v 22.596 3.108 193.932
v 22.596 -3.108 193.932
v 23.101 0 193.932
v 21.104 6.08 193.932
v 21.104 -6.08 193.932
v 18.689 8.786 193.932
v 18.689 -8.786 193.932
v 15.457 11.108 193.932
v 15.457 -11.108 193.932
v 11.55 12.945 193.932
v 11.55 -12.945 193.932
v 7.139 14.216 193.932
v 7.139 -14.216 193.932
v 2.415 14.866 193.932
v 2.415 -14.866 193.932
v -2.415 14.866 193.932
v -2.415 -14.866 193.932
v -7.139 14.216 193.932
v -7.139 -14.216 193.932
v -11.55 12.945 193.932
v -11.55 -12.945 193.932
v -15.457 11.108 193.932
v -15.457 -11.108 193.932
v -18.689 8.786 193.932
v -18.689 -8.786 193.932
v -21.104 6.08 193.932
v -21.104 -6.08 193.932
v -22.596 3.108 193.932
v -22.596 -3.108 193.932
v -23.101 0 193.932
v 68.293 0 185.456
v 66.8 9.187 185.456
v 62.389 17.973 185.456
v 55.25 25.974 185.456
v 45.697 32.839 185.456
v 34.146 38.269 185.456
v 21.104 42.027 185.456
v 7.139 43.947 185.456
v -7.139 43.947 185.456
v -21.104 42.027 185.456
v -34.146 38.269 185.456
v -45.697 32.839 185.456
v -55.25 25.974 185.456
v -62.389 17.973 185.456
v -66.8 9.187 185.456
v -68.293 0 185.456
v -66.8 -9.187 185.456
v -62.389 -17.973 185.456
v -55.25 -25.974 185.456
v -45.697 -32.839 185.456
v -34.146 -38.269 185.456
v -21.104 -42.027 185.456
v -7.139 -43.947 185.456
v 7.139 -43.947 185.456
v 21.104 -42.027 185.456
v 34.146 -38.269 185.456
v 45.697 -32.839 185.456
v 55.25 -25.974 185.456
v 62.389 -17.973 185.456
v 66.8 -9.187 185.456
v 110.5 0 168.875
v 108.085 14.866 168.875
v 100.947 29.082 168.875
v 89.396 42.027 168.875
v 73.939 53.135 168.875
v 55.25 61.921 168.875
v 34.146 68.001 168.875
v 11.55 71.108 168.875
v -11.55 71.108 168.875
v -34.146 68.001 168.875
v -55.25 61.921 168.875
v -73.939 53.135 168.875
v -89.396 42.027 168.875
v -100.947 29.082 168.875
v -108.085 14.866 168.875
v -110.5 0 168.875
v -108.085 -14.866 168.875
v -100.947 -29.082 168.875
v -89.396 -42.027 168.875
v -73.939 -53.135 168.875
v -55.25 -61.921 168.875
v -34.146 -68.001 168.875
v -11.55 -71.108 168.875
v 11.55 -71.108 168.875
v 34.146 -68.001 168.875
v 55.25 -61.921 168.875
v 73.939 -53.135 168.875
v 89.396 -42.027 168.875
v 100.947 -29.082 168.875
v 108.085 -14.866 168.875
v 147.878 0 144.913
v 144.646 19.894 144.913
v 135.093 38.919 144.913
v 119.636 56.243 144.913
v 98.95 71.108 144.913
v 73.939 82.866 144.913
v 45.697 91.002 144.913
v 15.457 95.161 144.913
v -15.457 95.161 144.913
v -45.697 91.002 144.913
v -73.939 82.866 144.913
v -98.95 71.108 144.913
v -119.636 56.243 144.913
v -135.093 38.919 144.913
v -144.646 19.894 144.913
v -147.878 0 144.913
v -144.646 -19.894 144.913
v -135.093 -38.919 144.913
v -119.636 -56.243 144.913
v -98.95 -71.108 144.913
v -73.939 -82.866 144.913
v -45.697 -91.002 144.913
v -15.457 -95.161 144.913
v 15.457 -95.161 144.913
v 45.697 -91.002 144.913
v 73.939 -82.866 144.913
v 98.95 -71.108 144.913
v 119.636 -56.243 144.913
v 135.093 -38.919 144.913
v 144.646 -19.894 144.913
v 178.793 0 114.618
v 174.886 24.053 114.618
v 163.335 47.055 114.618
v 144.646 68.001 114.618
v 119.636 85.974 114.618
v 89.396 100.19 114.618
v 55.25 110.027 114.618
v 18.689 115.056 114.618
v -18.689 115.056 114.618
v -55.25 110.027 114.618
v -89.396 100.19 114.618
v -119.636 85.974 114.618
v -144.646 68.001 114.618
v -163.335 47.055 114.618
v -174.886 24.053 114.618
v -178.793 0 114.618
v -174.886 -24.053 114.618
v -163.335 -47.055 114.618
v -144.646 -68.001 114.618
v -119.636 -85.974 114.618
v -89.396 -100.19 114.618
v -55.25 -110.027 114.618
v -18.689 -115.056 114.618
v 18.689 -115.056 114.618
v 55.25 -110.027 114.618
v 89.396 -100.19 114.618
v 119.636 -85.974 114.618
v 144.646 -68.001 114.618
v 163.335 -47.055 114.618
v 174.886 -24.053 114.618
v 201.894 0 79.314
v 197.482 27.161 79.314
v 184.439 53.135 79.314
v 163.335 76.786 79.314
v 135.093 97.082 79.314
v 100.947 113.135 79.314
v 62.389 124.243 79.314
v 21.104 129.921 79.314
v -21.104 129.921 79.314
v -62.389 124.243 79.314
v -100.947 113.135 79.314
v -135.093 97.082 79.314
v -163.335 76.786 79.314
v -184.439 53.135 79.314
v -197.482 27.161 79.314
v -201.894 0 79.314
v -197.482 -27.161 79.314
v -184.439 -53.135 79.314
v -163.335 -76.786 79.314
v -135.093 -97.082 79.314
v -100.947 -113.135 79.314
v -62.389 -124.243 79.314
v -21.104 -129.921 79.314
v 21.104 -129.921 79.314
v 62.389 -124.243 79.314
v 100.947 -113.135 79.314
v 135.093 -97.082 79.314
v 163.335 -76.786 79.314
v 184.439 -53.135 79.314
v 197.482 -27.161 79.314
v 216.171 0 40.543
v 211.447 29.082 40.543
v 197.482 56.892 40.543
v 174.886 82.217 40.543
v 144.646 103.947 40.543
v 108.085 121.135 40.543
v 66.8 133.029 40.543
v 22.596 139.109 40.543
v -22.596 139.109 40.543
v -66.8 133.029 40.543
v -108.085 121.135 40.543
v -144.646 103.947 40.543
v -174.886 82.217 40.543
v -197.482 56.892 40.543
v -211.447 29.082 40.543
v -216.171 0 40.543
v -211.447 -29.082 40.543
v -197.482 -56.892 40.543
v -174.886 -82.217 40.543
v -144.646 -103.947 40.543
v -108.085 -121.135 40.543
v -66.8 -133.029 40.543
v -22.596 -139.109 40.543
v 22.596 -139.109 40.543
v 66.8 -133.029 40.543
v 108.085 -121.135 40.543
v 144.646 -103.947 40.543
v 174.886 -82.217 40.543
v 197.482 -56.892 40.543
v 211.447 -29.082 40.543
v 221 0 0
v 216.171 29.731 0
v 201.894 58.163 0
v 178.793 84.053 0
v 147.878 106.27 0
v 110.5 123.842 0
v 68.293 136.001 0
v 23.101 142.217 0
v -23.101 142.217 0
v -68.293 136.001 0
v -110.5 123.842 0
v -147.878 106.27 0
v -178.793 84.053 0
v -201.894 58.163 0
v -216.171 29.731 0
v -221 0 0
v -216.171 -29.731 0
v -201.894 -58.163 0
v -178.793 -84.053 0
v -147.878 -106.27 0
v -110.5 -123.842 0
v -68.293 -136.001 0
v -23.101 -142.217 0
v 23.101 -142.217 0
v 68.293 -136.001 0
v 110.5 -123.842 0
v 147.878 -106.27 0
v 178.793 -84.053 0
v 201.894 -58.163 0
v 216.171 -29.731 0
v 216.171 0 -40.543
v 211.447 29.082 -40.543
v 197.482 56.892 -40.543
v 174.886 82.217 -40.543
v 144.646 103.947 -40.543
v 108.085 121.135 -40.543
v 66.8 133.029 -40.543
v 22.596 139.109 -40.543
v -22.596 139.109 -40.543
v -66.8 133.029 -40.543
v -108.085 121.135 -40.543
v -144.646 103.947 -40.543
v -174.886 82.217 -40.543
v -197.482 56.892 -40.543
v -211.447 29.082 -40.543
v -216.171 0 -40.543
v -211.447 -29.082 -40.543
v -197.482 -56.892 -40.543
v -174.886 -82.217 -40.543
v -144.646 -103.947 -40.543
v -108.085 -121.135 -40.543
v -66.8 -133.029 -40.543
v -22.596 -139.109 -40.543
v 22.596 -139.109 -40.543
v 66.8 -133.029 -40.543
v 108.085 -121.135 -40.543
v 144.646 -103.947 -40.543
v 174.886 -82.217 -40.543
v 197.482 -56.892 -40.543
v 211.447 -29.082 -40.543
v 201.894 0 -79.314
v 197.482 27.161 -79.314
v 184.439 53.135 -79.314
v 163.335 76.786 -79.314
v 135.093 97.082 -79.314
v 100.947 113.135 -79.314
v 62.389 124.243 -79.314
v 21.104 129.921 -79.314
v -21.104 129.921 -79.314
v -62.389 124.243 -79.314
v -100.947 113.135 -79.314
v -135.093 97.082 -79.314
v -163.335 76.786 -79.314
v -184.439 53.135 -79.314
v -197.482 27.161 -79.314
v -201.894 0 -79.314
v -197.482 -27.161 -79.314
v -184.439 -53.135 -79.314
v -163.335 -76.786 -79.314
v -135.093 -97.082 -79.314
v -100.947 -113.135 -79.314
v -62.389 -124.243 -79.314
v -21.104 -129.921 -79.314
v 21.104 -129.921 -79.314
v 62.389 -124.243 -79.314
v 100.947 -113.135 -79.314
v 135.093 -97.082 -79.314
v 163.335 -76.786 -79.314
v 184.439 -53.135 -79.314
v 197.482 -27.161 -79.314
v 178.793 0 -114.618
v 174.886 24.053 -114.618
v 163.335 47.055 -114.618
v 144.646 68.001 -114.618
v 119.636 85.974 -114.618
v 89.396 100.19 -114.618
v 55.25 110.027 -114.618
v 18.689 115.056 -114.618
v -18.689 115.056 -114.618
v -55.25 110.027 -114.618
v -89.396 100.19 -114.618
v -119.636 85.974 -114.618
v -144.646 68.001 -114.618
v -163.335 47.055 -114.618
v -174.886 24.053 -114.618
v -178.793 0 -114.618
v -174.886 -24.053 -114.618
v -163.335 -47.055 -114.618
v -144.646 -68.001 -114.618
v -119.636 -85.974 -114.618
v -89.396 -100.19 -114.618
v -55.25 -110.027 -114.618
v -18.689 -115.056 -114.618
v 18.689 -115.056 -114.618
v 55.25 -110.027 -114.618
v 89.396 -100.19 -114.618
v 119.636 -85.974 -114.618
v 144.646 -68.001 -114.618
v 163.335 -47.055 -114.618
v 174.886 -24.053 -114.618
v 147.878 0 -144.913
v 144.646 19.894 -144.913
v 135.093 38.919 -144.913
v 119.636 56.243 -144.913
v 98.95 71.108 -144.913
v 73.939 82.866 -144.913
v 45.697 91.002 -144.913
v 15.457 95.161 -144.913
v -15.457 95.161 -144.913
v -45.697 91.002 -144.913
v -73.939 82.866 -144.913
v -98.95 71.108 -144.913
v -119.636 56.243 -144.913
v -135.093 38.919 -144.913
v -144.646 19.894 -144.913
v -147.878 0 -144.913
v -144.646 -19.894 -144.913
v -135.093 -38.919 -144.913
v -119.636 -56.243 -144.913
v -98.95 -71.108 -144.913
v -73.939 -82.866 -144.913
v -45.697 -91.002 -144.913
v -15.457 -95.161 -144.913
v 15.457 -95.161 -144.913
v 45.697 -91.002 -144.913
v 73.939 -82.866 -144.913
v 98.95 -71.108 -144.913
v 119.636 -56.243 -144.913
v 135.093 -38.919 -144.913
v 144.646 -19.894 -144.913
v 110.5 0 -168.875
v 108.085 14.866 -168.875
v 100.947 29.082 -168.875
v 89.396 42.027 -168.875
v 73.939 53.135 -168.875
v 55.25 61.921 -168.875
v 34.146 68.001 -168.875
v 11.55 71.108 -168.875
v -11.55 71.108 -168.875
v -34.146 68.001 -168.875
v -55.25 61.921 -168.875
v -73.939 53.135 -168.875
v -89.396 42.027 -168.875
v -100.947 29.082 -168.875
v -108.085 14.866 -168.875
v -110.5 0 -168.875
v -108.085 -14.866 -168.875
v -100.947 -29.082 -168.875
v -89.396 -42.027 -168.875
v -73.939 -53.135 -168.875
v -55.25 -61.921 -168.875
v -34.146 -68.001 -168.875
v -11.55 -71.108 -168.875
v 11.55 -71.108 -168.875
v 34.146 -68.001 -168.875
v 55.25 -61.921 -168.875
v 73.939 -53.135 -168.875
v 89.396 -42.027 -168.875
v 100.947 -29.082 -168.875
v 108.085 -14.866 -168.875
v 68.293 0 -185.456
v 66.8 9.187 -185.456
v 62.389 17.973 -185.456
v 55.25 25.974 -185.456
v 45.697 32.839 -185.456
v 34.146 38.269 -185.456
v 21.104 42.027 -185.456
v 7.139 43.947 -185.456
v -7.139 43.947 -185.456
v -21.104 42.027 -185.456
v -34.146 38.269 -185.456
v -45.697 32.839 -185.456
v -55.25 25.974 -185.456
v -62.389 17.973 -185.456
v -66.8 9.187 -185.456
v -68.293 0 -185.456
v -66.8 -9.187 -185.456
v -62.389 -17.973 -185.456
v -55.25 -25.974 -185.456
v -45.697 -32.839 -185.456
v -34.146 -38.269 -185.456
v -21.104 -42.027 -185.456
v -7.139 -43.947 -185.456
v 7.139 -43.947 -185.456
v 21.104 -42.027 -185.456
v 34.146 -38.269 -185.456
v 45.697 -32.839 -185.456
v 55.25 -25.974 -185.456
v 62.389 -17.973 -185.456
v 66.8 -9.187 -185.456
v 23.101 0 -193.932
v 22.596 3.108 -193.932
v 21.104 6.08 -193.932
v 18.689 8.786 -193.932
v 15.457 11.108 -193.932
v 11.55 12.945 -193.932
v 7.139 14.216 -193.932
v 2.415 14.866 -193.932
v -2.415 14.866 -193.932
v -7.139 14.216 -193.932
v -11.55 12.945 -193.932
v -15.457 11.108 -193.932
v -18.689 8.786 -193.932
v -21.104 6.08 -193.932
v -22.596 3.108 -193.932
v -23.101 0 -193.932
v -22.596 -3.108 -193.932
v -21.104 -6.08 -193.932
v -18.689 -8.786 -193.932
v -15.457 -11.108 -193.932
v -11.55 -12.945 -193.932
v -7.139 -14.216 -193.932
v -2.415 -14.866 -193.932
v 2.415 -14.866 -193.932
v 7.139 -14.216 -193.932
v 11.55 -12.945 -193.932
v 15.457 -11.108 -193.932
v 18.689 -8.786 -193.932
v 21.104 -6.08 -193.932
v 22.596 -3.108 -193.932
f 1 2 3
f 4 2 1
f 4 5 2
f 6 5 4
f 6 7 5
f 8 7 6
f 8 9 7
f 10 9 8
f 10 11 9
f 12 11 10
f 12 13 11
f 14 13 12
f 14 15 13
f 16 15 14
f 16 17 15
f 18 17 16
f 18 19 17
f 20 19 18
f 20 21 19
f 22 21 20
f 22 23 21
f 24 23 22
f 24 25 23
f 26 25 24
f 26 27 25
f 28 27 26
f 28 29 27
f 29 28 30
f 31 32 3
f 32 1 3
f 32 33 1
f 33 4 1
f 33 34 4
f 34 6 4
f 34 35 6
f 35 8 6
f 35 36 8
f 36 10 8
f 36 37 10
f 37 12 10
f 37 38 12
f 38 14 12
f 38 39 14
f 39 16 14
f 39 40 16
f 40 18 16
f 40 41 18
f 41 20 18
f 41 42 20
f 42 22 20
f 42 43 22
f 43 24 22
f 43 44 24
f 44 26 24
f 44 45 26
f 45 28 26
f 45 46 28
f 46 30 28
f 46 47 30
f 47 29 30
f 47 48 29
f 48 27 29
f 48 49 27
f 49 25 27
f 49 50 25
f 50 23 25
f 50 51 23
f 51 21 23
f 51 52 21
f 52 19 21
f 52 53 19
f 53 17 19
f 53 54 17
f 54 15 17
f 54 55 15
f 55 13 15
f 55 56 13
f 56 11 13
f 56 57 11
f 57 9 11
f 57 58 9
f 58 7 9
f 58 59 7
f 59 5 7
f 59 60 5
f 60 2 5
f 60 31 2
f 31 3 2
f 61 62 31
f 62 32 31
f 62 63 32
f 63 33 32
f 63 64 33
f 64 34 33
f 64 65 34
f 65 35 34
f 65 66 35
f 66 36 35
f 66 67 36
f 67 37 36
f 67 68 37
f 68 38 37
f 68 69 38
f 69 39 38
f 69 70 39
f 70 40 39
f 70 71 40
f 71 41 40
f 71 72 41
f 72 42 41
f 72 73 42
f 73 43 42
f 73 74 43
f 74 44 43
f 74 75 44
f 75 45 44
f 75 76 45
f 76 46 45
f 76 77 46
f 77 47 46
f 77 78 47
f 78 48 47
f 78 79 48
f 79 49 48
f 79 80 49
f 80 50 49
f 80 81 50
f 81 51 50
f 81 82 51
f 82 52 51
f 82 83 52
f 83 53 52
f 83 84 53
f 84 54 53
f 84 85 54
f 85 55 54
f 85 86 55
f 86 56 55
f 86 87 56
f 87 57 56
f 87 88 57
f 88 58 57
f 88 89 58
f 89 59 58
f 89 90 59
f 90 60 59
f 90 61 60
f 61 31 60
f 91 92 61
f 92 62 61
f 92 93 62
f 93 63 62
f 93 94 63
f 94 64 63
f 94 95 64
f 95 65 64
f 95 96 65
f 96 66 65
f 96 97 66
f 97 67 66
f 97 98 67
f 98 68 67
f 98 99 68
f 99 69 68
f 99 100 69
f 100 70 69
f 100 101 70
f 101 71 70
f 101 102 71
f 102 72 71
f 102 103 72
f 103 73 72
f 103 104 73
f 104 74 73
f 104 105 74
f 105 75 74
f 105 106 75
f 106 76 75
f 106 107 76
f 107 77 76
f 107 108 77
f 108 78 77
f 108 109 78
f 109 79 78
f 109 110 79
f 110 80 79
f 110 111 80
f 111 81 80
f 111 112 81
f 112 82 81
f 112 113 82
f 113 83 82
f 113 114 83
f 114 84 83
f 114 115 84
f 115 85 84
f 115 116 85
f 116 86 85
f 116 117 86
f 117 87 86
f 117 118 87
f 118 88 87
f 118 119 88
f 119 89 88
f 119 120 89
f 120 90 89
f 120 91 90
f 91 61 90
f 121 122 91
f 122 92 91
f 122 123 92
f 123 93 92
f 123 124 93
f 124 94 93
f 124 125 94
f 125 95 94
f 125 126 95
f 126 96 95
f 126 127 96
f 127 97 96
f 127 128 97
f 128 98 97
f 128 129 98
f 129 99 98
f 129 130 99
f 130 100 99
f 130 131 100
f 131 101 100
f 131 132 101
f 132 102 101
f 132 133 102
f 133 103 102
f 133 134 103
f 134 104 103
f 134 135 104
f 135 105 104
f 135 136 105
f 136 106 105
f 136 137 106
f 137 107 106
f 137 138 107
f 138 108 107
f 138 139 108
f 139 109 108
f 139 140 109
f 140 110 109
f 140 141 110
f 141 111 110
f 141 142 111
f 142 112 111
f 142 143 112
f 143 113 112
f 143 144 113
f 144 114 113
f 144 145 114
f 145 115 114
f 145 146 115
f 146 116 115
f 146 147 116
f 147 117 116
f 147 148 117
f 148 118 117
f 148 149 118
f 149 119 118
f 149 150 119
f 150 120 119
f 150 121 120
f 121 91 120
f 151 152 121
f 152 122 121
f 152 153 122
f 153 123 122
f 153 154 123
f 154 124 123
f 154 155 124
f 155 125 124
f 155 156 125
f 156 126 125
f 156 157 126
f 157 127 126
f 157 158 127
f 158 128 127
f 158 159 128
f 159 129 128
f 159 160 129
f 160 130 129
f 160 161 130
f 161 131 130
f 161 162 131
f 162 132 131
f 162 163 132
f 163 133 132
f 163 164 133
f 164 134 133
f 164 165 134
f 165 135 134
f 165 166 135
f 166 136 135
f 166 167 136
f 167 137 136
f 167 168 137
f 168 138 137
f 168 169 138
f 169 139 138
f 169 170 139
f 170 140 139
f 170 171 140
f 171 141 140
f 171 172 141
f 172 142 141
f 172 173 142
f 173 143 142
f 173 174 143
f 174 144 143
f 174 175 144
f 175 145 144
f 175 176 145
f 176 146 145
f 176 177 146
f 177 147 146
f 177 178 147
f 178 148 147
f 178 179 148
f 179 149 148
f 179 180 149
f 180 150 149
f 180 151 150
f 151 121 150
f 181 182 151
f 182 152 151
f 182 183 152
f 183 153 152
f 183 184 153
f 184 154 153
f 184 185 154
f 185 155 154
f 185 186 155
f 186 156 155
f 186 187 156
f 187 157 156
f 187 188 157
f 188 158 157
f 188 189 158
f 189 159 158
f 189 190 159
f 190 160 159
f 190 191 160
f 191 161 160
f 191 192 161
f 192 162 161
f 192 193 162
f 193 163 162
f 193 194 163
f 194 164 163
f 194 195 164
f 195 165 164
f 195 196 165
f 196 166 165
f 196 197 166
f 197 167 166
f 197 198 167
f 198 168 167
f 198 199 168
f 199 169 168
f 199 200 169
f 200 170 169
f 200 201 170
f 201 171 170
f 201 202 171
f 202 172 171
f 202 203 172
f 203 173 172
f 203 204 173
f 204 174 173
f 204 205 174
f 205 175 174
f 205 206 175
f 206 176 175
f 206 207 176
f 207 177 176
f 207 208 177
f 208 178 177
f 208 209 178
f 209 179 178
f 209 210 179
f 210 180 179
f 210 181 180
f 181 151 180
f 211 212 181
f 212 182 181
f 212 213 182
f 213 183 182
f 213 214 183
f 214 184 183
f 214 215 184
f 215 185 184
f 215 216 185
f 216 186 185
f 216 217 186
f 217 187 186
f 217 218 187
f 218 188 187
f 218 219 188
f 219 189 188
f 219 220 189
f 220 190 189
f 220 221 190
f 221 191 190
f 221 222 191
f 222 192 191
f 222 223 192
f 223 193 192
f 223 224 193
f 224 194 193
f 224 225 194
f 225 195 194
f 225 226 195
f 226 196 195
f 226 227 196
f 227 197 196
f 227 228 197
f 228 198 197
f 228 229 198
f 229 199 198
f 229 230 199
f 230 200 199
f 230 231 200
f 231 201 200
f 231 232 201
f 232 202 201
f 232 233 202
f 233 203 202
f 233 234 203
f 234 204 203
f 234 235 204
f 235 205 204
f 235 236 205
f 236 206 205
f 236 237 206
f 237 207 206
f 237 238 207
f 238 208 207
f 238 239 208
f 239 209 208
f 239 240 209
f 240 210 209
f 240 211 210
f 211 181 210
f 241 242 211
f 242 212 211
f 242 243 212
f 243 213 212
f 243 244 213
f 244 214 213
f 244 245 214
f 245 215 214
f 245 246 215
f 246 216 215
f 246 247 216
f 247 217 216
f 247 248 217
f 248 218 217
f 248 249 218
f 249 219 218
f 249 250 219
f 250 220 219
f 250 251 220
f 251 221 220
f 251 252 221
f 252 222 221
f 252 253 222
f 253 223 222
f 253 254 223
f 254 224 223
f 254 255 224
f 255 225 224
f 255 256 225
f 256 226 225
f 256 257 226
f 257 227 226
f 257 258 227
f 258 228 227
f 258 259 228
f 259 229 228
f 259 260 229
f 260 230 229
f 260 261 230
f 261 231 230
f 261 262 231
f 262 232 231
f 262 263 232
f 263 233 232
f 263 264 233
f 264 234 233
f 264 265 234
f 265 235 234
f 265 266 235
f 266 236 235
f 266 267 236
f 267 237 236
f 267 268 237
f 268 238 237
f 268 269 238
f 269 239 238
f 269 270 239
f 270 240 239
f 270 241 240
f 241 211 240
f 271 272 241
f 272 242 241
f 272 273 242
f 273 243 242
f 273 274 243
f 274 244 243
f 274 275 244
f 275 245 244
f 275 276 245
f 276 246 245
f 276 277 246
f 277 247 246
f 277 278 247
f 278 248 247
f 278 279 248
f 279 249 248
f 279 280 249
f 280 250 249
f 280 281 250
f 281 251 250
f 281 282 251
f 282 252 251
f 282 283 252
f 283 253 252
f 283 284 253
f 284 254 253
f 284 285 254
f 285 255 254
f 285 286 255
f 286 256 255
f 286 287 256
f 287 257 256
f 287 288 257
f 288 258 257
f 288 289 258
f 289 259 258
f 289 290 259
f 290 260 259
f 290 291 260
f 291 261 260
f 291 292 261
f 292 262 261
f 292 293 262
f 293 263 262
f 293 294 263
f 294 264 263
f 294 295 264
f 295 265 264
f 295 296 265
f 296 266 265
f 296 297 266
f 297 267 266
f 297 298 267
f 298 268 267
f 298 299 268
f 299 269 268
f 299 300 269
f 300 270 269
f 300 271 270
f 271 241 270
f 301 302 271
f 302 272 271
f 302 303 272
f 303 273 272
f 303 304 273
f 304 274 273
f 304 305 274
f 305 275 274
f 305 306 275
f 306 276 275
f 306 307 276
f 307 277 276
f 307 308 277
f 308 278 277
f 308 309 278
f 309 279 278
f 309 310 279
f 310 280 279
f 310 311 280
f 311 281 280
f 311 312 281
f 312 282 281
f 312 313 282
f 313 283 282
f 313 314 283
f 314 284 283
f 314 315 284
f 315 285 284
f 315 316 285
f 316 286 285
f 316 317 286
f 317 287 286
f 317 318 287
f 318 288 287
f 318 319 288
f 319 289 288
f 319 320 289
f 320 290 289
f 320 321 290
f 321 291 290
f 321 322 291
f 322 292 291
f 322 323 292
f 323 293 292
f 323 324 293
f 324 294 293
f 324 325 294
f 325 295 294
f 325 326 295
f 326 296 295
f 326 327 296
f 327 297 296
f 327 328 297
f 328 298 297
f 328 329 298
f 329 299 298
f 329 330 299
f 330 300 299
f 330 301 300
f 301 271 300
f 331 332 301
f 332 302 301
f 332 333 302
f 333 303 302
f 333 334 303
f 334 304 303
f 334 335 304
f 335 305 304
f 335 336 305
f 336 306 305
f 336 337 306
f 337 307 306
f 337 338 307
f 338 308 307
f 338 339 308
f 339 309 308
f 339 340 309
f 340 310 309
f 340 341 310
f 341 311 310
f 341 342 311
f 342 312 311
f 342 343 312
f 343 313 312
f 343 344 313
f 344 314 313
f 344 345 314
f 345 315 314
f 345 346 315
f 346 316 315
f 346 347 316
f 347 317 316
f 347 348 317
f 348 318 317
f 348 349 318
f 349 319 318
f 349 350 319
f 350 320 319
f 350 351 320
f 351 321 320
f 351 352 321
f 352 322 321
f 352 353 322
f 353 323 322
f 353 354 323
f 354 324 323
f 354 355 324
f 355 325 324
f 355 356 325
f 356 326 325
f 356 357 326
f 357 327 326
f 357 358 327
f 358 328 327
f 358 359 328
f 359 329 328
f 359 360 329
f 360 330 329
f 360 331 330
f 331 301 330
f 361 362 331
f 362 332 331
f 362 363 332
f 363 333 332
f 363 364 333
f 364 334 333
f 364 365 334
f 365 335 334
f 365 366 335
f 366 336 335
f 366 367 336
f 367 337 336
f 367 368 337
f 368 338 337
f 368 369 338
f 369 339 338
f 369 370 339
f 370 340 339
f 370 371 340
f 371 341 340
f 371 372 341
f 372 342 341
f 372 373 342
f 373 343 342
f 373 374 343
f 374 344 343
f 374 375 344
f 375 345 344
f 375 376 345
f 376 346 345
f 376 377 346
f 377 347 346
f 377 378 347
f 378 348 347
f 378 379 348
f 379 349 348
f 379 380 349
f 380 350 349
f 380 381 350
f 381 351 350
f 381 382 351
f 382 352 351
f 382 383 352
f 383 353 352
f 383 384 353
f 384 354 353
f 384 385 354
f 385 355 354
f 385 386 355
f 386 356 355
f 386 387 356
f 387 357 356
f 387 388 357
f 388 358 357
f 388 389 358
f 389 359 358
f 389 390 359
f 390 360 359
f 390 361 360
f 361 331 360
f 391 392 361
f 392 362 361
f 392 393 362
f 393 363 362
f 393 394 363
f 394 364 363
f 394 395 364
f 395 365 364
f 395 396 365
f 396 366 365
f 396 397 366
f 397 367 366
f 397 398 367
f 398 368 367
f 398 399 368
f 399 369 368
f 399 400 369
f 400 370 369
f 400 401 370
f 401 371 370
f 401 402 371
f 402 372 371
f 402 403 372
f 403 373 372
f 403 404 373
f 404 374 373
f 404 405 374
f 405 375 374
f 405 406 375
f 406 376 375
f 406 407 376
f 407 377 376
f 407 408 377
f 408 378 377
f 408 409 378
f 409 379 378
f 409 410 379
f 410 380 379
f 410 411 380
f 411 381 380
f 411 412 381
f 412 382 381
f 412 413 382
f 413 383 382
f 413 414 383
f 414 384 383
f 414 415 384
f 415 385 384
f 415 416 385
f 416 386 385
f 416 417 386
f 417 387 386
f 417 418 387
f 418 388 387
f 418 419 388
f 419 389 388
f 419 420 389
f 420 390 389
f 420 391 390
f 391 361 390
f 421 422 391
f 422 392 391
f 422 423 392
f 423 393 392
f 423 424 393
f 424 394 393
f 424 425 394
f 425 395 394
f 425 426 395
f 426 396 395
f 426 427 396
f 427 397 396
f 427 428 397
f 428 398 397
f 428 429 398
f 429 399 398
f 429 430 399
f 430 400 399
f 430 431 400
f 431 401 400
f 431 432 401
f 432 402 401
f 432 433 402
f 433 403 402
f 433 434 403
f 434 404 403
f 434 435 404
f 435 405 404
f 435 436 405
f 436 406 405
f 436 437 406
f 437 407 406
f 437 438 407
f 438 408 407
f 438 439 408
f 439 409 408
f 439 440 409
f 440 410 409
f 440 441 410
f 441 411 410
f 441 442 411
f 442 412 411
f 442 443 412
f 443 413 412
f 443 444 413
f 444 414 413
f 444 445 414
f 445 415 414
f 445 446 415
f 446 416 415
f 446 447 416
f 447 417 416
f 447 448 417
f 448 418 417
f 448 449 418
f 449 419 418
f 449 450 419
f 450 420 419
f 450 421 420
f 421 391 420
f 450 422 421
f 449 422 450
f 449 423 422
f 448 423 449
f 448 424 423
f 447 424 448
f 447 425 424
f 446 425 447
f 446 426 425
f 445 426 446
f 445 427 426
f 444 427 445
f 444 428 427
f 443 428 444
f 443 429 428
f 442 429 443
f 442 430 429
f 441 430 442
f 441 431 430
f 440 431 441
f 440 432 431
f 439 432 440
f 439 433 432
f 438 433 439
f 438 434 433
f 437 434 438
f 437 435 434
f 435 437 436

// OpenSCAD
// Generated by SolidPython 1.0.1 on 2020-07-29 00:46:53


scale(v = [17, 11, 15]) {
	sphere(r = 13);
}
/***********************************************
*********      SolidPython code:      **********
************************************************
 
# import packages: SolidPython
from solid import *
from solid.utils import *
from itertools import chain, combinations, permutations


class Resize:

    def __init__(self, scad_file):
        self.scad_file = scad_file
        #self.scad_file = import_scad(scad_file)
        # cone/cylinder param:
        self.r1 = 0
        self.r2 = 0
        self.h = 0
        # rectangular prism param:
        self.w = 0
        self.l = 0
        # ellipse param:
        self.r = 0

    # import OpenScad code (file name corresponds to shape)


    # classify shape + parameters
    def assign(self, param1, param2, param3):
        if self.scad_file == 'cone.scad':
            self.r1 = param1
            self.r2 = param2
            self.h = param3
        elif self.scad_file == 'cylinder.scad':
            self.r1 = param1
            self.r2 = param2
            self.h = param3
        elif self.scad_file == 'rectangularPrism.scad':
            self.h = param1
            self.l = param2
            self.w = param3
        else:
            self.r = param1
            self.h = param2

    # resize parameters
    def iterate(self):
        x = range(3, 20, 2)
        i = 1
        if self.scad_file == 'cone.scad':
            tempList = list(permutations(x, 2))
            for temp in tempList:
                param1 = temp[0]
                param2 = temp[1]
                filepath = 'produced_scad_files/' + 'cone' + str(param1) + '_' + str(param2) + '_' + '.scad'
                scad_render_to_file(cylinder(h=param1, r1=param2, r2=0), filepath)

        elif self.scad_file == 'cylinder.scad':
            tempList = list(permutations(x, 3))
            for temp in tempList:
                param1 = temp[0]
                param2 = temp[1]
                filepath = 'produced_scad_files/' + 'cylinder' + str(param1) + '_' + str(param2) + '_' + '.scad'
                scad_render_to_file(cylinder(h=param1, r1=param2, r2=param2), filepath)

        elif self.scad_file == 'rectangularPrism.scad':
            tempList = list(permutations(x, 3))
            for temp in tempList:
                param1 = temp[0]
                param2 = temp[1]
                param3 = temp[2]
                filepath = 'produced_scad_files/' + 'rectangularPrism' + str(param1) + '_' + str(param2) + '_' + str(
                    param3) + '.scad'
                scad_render_to_file(cube(size=(param1, param2, param3)), filepath)

        elif self.scad_file == 'ellipse.scad':
            tempList = list(permutations(x, 4))
            for temp in tempList:
                param1 = temp[0]
                param2 = temp[1]
                param3 = temp[2]
                param4 = temp[3]
                filepath = 'produced_scad_files/' + 'ellipse' + str(param1) + '_' + str(param2) + '_' + str(param3) + '_' + str(param4) + '.scad'
                scad_render_to_file(scale([param1, param2, param3])(sphere(r=param4)), filepath)

    def render_to_scadfile(self):
        scad_render_to_file(scad, 'example.scad') 
 
************************************************/
